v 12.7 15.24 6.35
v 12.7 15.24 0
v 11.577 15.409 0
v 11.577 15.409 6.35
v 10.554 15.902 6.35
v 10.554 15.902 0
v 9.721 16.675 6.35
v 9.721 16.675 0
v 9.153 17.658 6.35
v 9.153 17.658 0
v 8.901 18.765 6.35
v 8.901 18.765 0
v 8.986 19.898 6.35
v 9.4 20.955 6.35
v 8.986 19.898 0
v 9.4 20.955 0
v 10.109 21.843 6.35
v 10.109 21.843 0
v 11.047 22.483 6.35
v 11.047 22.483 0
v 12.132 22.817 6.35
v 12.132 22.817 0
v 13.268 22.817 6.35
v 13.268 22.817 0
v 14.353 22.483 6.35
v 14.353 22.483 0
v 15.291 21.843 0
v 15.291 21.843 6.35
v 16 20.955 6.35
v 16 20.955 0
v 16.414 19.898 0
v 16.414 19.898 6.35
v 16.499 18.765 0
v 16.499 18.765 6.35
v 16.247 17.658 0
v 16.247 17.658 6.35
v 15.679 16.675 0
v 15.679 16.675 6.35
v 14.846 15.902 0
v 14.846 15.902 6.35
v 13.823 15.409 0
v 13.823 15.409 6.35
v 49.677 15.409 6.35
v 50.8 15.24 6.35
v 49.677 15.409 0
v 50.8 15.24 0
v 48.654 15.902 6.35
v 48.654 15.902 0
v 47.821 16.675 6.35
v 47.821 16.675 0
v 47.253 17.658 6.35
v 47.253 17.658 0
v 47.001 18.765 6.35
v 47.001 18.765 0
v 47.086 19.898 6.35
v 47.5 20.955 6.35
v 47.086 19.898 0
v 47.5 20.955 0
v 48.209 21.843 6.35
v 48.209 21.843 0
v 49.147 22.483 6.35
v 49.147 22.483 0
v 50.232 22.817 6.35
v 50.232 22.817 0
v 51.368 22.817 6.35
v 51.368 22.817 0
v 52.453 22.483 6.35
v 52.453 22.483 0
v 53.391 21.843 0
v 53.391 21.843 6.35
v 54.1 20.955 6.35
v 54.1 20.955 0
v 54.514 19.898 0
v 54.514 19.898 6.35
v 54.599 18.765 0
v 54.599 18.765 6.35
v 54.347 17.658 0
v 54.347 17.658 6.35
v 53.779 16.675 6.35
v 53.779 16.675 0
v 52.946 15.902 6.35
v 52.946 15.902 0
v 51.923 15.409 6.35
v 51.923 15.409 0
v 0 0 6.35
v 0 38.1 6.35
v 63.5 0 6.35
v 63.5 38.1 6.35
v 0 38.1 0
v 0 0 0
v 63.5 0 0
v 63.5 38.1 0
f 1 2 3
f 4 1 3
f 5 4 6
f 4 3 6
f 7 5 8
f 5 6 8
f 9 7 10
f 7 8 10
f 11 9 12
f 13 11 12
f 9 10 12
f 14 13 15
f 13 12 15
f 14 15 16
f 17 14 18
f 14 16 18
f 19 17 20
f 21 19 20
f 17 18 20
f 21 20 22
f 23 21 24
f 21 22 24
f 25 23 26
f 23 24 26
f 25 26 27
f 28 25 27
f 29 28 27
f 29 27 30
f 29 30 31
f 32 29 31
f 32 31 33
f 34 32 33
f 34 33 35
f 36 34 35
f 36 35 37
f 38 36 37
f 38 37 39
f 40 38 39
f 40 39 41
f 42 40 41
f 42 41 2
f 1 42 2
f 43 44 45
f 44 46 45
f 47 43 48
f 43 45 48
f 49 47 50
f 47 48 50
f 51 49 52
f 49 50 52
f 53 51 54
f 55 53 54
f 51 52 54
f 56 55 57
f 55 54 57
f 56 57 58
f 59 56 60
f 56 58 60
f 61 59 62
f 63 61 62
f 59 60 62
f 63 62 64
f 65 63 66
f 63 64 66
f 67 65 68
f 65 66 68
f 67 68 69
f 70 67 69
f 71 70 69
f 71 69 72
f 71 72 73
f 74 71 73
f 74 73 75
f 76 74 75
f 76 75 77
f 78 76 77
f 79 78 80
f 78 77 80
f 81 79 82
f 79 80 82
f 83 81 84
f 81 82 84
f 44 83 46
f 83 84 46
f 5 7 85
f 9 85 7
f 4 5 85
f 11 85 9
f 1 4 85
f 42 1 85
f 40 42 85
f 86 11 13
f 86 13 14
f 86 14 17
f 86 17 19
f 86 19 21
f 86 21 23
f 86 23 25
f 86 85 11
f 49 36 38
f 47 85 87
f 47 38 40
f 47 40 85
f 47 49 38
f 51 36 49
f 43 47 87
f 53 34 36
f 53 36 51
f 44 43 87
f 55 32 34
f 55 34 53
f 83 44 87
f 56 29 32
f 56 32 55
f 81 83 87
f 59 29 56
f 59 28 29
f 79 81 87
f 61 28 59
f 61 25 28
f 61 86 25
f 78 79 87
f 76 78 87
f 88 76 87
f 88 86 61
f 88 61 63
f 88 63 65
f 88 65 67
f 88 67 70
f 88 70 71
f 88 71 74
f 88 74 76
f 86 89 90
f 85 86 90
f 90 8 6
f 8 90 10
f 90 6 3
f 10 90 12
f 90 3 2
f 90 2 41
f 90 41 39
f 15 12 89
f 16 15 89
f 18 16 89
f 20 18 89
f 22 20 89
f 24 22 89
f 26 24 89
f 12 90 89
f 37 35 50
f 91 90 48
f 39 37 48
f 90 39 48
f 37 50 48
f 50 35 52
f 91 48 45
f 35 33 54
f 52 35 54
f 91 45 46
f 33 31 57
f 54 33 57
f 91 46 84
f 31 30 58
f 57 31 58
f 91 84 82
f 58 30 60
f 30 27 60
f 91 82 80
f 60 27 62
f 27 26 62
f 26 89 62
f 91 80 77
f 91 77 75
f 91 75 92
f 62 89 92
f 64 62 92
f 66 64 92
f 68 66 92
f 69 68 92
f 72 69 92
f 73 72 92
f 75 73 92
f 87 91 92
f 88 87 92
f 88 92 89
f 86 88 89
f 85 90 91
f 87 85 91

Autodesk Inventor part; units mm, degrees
ref_plane "YZ Plane" through (0, 0, 0) normal (1, 0, 0) x (0, 1, 0)
ref_plane "XZ Plane" through (0, 0, 0) normal (0, 1, 0) x (-1, 0, 0)
ref_plane "XY Plane" through (0, 0, 0) normal (0, 0, 1) x (1, 0, 0)
sketch "Sketch1" plane through (0, 0, 0) normal (0, 0, 1) x (1, 0, 0)
  line L0 (0, 0) -> (63.5, 0)
  line L1 (63.5, 0) -> (63.5, 38.1)
  line L2 (63.5, 38.1) -> (0, 38.1)
  line L3 (0, 38.1) -> (0, 0)
  dimension "d0" = 63.5
  dimension "d1" = 38.1
extrude "Extrusion1" add sketch "Sketch1" along normal blind 6.35
sketch "Sketch2" plane through (0, 0, 6.35) normal (0, 0, 1) x (1, 0, 0)
  line L0 (0, 38.1) -> (0, 0) projected
  line L1 (0, 19.05) -> (12.7, 19.05)
  line L2 (63.5, 0) -> (63.5, 38.1) projected
  line L3 (63.5, 19.05) -> (50.8, 19.05)
  line L4 (63.5, 19.05) -> (76.2, 19.05) construction
  dimension "d4" = 12.7
  dimension "d5" = 12.7
  dimension "d6" = 180
hole "Hole1" at (12.7, 19.05, 6.35) at (50.8, 19.05, 6.35) direction (0, 0, -1) diameter 7.62 depth 25.4 tip angle 118
properties part number "RelicArmSpacer"
